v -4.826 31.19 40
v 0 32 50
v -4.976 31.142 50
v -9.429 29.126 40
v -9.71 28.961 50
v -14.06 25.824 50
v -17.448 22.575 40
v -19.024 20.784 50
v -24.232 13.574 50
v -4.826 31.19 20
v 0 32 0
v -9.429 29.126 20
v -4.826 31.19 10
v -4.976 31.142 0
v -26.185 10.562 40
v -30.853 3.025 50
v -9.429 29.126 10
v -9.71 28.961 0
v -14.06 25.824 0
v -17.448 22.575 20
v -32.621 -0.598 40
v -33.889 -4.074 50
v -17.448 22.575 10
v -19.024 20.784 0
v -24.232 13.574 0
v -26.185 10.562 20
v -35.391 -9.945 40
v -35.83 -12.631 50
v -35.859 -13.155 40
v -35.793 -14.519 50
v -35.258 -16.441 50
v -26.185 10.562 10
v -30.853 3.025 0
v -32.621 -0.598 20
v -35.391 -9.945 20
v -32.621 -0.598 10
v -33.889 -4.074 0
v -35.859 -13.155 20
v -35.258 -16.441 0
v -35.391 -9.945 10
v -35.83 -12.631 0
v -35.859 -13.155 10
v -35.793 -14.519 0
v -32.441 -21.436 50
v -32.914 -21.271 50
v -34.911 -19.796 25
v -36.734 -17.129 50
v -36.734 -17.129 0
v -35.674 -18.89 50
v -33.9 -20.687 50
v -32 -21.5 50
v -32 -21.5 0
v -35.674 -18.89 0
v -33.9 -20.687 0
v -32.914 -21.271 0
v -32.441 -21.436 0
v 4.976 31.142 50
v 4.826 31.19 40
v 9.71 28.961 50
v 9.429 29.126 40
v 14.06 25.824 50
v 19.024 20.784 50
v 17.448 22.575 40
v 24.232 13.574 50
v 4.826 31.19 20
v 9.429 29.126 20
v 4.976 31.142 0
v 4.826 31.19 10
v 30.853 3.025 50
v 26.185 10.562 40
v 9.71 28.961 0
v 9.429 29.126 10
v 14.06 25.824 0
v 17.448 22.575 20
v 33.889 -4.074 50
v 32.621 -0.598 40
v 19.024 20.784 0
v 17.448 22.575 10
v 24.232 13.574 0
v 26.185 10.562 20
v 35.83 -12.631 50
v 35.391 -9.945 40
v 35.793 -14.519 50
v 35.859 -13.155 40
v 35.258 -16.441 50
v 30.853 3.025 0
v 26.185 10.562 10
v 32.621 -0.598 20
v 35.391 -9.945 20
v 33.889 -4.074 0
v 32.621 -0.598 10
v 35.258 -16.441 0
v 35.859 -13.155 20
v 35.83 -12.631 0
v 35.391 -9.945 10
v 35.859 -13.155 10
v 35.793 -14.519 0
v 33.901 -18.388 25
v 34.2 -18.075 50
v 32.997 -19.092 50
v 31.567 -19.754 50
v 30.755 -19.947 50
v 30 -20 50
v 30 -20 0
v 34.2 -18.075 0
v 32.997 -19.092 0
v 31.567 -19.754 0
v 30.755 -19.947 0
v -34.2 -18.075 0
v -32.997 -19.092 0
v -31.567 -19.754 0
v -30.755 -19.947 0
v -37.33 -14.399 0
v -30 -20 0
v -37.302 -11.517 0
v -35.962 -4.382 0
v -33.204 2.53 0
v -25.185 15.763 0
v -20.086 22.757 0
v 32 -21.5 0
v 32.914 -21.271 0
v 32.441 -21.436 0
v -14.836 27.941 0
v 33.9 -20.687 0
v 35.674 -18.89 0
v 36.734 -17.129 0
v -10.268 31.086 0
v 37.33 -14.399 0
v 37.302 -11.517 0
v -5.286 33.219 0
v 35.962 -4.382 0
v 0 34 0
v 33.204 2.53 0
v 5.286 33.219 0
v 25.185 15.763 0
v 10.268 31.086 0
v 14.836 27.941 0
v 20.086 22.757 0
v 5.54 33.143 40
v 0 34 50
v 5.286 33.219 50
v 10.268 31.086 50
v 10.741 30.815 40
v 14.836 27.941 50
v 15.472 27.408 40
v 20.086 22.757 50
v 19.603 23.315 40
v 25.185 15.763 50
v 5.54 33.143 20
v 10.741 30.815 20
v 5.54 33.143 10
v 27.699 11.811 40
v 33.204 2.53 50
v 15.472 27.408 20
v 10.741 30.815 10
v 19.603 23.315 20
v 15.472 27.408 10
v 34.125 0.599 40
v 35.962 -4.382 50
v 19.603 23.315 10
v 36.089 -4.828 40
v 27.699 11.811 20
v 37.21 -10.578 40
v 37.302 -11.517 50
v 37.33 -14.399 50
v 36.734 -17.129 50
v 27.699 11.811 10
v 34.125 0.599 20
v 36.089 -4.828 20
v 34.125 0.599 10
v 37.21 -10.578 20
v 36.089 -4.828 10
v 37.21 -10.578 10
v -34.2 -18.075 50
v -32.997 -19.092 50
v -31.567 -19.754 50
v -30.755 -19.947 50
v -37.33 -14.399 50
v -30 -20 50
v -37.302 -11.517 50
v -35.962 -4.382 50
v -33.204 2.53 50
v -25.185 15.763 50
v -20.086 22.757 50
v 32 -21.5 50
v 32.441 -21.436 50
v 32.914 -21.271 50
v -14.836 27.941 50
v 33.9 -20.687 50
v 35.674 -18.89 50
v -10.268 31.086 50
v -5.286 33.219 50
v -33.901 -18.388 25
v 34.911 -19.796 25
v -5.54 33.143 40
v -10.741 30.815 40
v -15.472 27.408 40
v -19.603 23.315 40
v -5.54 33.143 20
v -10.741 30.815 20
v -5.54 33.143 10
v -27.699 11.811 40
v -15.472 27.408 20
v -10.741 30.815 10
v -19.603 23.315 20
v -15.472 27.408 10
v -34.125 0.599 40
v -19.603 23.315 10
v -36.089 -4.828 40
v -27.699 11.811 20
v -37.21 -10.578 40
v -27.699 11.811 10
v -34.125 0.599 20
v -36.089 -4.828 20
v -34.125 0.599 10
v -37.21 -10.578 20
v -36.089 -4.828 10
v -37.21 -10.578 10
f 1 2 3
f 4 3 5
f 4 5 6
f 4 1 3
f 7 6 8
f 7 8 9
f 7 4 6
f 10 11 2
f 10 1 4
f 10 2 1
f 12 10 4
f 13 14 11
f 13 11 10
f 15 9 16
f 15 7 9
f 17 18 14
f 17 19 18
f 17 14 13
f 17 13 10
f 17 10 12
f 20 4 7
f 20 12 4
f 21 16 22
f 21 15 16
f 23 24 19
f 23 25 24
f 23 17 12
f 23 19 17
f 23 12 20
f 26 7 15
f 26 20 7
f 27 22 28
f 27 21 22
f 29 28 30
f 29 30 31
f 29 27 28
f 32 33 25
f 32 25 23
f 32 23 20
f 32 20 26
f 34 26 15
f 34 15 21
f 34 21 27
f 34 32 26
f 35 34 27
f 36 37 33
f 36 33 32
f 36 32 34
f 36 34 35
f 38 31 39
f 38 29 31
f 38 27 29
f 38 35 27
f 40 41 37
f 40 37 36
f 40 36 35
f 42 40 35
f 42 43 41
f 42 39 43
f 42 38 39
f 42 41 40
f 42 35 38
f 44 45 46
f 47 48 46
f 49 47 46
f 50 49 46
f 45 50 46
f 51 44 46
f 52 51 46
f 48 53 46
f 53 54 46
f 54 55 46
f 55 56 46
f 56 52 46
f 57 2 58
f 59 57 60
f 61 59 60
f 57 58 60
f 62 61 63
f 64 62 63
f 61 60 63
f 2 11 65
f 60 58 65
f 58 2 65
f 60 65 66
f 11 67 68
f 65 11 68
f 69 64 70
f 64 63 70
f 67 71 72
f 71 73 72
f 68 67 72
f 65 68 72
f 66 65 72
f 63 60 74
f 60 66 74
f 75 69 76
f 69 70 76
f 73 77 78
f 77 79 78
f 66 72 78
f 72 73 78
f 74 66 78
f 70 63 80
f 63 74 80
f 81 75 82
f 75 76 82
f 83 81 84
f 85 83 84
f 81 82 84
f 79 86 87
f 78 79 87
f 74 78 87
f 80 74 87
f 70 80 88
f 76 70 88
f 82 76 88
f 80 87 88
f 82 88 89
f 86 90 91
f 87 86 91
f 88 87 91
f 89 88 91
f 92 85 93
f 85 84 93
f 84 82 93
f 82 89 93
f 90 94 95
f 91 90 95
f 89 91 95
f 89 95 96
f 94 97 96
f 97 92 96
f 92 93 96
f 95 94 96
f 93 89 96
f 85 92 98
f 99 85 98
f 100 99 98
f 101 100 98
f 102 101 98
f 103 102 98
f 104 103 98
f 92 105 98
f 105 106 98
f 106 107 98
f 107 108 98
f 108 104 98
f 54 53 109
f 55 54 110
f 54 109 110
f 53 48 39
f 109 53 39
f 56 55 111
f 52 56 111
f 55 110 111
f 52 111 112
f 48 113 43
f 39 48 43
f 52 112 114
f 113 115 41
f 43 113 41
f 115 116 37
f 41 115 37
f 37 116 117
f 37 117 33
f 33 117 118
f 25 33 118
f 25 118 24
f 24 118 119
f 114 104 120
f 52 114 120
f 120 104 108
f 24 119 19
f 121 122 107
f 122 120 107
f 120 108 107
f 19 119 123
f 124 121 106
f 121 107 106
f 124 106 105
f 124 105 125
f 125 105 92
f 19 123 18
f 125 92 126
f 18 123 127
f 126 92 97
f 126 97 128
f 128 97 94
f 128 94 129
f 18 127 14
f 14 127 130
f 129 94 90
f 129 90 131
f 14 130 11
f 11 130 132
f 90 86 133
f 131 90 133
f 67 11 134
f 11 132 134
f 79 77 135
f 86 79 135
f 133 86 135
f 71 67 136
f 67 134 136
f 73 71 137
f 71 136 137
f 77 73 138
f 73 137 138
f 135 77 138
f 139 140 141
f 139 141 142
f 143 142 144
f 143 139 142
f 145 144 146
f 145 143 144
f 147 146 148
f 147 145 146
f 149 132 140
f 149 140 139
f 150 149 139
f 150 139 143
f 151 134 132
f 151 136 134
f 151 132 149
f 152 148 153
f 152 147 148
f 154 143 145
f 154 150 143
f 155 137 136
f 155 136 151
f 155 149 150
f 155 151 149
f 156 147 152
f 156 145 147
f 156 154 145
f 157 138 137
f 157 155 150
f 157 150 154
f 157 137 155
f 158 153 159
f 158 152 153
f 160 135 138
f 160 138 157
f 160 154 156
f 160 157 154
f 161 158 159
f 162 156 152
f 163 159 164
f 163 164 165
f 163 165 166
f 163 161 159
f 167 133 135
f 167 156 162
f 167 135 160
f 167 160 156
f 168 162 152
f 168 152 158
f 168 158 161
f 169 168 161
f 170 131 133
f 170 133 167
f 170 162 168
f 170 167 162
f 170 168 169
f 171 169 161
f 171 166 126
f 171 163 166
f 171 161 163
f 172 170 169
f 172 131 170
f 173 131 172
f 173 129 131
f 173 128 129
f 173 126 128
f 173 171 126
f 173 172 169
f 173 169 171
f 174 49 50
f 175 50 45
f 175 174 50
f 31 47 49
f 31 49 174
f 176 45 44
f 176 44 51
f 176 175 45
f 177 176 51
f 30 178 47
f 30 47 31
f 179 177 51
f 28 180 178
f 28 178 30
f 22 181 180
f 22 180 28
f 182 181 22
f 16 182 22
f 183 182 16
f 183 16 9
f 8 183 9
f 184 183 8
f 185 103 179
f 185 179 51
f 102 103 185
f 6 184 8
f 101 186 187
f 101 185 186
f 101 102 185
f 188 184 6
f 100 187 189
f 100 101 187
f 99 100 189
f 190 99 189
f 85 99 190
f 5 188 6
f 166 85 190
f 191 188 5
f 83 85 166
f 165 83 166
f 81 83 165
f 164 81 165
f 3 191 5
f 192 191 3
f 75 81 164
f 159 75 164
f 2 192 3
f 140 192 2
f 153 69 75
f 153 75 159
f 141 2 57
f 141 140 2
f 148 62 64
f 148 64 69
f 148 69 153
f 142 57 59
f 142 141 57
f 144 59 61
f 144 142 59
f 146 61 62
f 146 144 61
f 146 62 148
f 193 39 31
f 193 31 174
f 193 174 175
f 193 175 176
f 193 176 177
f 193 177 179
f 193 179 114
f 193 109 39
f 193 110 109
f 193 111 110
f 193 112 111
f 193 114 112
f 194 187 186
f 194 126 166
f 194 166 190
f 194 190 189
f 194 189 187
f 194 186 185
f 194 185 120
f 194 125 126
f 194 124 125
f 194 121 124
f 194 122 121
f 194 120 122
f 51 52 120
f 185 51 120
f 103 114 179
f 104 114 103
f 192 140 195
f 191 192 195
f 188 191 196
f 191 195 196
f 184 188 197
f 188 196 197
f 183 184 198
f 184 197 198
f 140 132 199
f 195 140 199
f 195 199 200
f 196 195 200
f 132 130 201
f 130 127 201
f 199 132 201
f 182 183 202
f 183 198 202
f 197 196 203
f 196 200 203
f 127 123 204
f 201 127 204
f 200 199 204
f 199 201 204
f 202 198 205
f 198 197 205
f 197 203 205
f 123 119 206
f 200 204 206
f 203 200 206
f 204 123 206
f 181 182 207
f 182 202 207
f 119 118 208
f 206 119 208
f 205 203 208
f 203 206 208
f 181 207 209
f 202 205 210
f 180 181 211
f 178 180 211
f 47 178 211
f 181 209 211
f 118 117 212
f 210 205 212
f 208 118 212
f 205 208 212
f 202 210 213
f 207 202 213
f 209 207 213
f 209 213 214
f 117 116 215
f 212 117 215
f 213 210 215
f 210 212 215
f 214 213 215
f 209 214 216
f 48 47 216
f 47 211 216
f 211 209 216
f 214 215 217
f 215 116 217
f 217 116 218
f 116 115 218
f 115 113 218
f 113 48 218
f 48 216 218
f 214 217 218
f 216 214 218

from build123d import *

# Parameters (mm, degrees)
EXTRUDE_1_DEPTH = 50


with BuildPart() as part:
    # 草图1 → 凸台-拉伸1 (new body)
    with BuildSketch(Plane.XY):
        with BuildLine():
            Line((-32, -21.5), (32, -21.5))
            add(Edge.make_bspline(
                [(36.733909542, -17.129303333), (36.442708458, -17.789293258), (35.093003072, -20.035409342), (32.859902831, -21.483095563), (32, -21.5)],
                knots=[0, 0, 0, 0, 0.489167663, 1, 1, 1, 1], degree=3))
            add(Edge.make_bspline(
                [(0, 34), (7.555913279, 34.011602268), (18.959944892, 25.933619789), (27.410768064, 12.158954921), (34.505617486, 1.231569585), (37.368528413, -8.742517367), (37.515489023, -15.116686236), (36.733909542, -17.129303333)],
                knots=[0, 0, 0, 0, 0.330857753, 0.539322829, 0.730827311, 0.902654757, 1, 1, 1, 1], degree=3))
            add(Edge.make_bspline(
                [(0, 34), (-7.555913279, 34.011602268), (-18.959944892, 25.933619789), (-27.410768064, 12.158954921), (-34.505617486, 1.231569585), (-37.368528413, -8.742517367), (-37.515489023, -15.116686236), (-36.733909542, -17.129303333)],
                knots=[0, 0, 0, 0, 0.330857753, 0.539322829, 0.730827311, 0.902654757, 1, 1, 1, 1], degree=3))
            add(Edge.make_bspline(
                [(-36.733909542, -17.129303333), (-36.442708458, -17.789293258), (-35.093003072, -20.035409342), (-32.859902831, -21.483095563), (-32, -21.5)],
                knots=[0, 0, 0, 0, 0.489167663, 1, 1, 1, 1], degree=3))
        make_face()
        with BuildLine():
            Line((-30, -20), (30, -20))
            add(Edge.make_bspline(
                [(35.258436844, -16.441279115), (34.996443421, -17.020908852), (33.690556146, -19.14256109), (31.185354686, -20.029316023), (30, -20)],
                knots=[0, 0, 0, 0, 0.359900696, 1, 1, 1, 1], degree=3))
            add(Edge.make_bspline(
                [(0, 32), (6.525531342, 31.903595671), (17.503513361, 24.330693276), (25.717632299, 11.137446439), (32.791173162, 0.606888673), (35.263590912, -8.864538837), (36.230061186, -14.212016256), (35.258436844, -16.441279115)],
                knots=[0, 0, 0, 0, 0.310761872, 0.543527622, 0.745406531, 0.898184222, 1, 1, 1, 1], degree=3))
            add(Edge.make_bspline(
                [(0, 32), (-6.525531342, 31.903595671), (-17.503513361, 24.330693276), (-25.717632299, 11.137446439), (-32.791173162, 0.606888673), (-35.263590912, -8.864538837), (-36.230061186, -14.212016256), (-35.258436844, -16.441279115)],
                knots=[0, 0, 0, 0, 0.310761872, 0.543527622, 0.745406531, 0.898184222, 1, 1, 1, 1], degree=3))
            add(Edge.make_bspline(
                [(-35.258436844, -16.441279115), (-34.996443421, -17.020908852), (-33.690556146, -19.14256109), (-31.185354686, -20.029316023), (-30, -20)],
                knots=[0, 0, 0, 0, 0.359900696, 1, 1, 1, 1], degree=3))
        make_face(mode=Mode.SUBTRACT)
    extrude(amount=EXTRUDE_1_DEPTH)


solid = part.part
